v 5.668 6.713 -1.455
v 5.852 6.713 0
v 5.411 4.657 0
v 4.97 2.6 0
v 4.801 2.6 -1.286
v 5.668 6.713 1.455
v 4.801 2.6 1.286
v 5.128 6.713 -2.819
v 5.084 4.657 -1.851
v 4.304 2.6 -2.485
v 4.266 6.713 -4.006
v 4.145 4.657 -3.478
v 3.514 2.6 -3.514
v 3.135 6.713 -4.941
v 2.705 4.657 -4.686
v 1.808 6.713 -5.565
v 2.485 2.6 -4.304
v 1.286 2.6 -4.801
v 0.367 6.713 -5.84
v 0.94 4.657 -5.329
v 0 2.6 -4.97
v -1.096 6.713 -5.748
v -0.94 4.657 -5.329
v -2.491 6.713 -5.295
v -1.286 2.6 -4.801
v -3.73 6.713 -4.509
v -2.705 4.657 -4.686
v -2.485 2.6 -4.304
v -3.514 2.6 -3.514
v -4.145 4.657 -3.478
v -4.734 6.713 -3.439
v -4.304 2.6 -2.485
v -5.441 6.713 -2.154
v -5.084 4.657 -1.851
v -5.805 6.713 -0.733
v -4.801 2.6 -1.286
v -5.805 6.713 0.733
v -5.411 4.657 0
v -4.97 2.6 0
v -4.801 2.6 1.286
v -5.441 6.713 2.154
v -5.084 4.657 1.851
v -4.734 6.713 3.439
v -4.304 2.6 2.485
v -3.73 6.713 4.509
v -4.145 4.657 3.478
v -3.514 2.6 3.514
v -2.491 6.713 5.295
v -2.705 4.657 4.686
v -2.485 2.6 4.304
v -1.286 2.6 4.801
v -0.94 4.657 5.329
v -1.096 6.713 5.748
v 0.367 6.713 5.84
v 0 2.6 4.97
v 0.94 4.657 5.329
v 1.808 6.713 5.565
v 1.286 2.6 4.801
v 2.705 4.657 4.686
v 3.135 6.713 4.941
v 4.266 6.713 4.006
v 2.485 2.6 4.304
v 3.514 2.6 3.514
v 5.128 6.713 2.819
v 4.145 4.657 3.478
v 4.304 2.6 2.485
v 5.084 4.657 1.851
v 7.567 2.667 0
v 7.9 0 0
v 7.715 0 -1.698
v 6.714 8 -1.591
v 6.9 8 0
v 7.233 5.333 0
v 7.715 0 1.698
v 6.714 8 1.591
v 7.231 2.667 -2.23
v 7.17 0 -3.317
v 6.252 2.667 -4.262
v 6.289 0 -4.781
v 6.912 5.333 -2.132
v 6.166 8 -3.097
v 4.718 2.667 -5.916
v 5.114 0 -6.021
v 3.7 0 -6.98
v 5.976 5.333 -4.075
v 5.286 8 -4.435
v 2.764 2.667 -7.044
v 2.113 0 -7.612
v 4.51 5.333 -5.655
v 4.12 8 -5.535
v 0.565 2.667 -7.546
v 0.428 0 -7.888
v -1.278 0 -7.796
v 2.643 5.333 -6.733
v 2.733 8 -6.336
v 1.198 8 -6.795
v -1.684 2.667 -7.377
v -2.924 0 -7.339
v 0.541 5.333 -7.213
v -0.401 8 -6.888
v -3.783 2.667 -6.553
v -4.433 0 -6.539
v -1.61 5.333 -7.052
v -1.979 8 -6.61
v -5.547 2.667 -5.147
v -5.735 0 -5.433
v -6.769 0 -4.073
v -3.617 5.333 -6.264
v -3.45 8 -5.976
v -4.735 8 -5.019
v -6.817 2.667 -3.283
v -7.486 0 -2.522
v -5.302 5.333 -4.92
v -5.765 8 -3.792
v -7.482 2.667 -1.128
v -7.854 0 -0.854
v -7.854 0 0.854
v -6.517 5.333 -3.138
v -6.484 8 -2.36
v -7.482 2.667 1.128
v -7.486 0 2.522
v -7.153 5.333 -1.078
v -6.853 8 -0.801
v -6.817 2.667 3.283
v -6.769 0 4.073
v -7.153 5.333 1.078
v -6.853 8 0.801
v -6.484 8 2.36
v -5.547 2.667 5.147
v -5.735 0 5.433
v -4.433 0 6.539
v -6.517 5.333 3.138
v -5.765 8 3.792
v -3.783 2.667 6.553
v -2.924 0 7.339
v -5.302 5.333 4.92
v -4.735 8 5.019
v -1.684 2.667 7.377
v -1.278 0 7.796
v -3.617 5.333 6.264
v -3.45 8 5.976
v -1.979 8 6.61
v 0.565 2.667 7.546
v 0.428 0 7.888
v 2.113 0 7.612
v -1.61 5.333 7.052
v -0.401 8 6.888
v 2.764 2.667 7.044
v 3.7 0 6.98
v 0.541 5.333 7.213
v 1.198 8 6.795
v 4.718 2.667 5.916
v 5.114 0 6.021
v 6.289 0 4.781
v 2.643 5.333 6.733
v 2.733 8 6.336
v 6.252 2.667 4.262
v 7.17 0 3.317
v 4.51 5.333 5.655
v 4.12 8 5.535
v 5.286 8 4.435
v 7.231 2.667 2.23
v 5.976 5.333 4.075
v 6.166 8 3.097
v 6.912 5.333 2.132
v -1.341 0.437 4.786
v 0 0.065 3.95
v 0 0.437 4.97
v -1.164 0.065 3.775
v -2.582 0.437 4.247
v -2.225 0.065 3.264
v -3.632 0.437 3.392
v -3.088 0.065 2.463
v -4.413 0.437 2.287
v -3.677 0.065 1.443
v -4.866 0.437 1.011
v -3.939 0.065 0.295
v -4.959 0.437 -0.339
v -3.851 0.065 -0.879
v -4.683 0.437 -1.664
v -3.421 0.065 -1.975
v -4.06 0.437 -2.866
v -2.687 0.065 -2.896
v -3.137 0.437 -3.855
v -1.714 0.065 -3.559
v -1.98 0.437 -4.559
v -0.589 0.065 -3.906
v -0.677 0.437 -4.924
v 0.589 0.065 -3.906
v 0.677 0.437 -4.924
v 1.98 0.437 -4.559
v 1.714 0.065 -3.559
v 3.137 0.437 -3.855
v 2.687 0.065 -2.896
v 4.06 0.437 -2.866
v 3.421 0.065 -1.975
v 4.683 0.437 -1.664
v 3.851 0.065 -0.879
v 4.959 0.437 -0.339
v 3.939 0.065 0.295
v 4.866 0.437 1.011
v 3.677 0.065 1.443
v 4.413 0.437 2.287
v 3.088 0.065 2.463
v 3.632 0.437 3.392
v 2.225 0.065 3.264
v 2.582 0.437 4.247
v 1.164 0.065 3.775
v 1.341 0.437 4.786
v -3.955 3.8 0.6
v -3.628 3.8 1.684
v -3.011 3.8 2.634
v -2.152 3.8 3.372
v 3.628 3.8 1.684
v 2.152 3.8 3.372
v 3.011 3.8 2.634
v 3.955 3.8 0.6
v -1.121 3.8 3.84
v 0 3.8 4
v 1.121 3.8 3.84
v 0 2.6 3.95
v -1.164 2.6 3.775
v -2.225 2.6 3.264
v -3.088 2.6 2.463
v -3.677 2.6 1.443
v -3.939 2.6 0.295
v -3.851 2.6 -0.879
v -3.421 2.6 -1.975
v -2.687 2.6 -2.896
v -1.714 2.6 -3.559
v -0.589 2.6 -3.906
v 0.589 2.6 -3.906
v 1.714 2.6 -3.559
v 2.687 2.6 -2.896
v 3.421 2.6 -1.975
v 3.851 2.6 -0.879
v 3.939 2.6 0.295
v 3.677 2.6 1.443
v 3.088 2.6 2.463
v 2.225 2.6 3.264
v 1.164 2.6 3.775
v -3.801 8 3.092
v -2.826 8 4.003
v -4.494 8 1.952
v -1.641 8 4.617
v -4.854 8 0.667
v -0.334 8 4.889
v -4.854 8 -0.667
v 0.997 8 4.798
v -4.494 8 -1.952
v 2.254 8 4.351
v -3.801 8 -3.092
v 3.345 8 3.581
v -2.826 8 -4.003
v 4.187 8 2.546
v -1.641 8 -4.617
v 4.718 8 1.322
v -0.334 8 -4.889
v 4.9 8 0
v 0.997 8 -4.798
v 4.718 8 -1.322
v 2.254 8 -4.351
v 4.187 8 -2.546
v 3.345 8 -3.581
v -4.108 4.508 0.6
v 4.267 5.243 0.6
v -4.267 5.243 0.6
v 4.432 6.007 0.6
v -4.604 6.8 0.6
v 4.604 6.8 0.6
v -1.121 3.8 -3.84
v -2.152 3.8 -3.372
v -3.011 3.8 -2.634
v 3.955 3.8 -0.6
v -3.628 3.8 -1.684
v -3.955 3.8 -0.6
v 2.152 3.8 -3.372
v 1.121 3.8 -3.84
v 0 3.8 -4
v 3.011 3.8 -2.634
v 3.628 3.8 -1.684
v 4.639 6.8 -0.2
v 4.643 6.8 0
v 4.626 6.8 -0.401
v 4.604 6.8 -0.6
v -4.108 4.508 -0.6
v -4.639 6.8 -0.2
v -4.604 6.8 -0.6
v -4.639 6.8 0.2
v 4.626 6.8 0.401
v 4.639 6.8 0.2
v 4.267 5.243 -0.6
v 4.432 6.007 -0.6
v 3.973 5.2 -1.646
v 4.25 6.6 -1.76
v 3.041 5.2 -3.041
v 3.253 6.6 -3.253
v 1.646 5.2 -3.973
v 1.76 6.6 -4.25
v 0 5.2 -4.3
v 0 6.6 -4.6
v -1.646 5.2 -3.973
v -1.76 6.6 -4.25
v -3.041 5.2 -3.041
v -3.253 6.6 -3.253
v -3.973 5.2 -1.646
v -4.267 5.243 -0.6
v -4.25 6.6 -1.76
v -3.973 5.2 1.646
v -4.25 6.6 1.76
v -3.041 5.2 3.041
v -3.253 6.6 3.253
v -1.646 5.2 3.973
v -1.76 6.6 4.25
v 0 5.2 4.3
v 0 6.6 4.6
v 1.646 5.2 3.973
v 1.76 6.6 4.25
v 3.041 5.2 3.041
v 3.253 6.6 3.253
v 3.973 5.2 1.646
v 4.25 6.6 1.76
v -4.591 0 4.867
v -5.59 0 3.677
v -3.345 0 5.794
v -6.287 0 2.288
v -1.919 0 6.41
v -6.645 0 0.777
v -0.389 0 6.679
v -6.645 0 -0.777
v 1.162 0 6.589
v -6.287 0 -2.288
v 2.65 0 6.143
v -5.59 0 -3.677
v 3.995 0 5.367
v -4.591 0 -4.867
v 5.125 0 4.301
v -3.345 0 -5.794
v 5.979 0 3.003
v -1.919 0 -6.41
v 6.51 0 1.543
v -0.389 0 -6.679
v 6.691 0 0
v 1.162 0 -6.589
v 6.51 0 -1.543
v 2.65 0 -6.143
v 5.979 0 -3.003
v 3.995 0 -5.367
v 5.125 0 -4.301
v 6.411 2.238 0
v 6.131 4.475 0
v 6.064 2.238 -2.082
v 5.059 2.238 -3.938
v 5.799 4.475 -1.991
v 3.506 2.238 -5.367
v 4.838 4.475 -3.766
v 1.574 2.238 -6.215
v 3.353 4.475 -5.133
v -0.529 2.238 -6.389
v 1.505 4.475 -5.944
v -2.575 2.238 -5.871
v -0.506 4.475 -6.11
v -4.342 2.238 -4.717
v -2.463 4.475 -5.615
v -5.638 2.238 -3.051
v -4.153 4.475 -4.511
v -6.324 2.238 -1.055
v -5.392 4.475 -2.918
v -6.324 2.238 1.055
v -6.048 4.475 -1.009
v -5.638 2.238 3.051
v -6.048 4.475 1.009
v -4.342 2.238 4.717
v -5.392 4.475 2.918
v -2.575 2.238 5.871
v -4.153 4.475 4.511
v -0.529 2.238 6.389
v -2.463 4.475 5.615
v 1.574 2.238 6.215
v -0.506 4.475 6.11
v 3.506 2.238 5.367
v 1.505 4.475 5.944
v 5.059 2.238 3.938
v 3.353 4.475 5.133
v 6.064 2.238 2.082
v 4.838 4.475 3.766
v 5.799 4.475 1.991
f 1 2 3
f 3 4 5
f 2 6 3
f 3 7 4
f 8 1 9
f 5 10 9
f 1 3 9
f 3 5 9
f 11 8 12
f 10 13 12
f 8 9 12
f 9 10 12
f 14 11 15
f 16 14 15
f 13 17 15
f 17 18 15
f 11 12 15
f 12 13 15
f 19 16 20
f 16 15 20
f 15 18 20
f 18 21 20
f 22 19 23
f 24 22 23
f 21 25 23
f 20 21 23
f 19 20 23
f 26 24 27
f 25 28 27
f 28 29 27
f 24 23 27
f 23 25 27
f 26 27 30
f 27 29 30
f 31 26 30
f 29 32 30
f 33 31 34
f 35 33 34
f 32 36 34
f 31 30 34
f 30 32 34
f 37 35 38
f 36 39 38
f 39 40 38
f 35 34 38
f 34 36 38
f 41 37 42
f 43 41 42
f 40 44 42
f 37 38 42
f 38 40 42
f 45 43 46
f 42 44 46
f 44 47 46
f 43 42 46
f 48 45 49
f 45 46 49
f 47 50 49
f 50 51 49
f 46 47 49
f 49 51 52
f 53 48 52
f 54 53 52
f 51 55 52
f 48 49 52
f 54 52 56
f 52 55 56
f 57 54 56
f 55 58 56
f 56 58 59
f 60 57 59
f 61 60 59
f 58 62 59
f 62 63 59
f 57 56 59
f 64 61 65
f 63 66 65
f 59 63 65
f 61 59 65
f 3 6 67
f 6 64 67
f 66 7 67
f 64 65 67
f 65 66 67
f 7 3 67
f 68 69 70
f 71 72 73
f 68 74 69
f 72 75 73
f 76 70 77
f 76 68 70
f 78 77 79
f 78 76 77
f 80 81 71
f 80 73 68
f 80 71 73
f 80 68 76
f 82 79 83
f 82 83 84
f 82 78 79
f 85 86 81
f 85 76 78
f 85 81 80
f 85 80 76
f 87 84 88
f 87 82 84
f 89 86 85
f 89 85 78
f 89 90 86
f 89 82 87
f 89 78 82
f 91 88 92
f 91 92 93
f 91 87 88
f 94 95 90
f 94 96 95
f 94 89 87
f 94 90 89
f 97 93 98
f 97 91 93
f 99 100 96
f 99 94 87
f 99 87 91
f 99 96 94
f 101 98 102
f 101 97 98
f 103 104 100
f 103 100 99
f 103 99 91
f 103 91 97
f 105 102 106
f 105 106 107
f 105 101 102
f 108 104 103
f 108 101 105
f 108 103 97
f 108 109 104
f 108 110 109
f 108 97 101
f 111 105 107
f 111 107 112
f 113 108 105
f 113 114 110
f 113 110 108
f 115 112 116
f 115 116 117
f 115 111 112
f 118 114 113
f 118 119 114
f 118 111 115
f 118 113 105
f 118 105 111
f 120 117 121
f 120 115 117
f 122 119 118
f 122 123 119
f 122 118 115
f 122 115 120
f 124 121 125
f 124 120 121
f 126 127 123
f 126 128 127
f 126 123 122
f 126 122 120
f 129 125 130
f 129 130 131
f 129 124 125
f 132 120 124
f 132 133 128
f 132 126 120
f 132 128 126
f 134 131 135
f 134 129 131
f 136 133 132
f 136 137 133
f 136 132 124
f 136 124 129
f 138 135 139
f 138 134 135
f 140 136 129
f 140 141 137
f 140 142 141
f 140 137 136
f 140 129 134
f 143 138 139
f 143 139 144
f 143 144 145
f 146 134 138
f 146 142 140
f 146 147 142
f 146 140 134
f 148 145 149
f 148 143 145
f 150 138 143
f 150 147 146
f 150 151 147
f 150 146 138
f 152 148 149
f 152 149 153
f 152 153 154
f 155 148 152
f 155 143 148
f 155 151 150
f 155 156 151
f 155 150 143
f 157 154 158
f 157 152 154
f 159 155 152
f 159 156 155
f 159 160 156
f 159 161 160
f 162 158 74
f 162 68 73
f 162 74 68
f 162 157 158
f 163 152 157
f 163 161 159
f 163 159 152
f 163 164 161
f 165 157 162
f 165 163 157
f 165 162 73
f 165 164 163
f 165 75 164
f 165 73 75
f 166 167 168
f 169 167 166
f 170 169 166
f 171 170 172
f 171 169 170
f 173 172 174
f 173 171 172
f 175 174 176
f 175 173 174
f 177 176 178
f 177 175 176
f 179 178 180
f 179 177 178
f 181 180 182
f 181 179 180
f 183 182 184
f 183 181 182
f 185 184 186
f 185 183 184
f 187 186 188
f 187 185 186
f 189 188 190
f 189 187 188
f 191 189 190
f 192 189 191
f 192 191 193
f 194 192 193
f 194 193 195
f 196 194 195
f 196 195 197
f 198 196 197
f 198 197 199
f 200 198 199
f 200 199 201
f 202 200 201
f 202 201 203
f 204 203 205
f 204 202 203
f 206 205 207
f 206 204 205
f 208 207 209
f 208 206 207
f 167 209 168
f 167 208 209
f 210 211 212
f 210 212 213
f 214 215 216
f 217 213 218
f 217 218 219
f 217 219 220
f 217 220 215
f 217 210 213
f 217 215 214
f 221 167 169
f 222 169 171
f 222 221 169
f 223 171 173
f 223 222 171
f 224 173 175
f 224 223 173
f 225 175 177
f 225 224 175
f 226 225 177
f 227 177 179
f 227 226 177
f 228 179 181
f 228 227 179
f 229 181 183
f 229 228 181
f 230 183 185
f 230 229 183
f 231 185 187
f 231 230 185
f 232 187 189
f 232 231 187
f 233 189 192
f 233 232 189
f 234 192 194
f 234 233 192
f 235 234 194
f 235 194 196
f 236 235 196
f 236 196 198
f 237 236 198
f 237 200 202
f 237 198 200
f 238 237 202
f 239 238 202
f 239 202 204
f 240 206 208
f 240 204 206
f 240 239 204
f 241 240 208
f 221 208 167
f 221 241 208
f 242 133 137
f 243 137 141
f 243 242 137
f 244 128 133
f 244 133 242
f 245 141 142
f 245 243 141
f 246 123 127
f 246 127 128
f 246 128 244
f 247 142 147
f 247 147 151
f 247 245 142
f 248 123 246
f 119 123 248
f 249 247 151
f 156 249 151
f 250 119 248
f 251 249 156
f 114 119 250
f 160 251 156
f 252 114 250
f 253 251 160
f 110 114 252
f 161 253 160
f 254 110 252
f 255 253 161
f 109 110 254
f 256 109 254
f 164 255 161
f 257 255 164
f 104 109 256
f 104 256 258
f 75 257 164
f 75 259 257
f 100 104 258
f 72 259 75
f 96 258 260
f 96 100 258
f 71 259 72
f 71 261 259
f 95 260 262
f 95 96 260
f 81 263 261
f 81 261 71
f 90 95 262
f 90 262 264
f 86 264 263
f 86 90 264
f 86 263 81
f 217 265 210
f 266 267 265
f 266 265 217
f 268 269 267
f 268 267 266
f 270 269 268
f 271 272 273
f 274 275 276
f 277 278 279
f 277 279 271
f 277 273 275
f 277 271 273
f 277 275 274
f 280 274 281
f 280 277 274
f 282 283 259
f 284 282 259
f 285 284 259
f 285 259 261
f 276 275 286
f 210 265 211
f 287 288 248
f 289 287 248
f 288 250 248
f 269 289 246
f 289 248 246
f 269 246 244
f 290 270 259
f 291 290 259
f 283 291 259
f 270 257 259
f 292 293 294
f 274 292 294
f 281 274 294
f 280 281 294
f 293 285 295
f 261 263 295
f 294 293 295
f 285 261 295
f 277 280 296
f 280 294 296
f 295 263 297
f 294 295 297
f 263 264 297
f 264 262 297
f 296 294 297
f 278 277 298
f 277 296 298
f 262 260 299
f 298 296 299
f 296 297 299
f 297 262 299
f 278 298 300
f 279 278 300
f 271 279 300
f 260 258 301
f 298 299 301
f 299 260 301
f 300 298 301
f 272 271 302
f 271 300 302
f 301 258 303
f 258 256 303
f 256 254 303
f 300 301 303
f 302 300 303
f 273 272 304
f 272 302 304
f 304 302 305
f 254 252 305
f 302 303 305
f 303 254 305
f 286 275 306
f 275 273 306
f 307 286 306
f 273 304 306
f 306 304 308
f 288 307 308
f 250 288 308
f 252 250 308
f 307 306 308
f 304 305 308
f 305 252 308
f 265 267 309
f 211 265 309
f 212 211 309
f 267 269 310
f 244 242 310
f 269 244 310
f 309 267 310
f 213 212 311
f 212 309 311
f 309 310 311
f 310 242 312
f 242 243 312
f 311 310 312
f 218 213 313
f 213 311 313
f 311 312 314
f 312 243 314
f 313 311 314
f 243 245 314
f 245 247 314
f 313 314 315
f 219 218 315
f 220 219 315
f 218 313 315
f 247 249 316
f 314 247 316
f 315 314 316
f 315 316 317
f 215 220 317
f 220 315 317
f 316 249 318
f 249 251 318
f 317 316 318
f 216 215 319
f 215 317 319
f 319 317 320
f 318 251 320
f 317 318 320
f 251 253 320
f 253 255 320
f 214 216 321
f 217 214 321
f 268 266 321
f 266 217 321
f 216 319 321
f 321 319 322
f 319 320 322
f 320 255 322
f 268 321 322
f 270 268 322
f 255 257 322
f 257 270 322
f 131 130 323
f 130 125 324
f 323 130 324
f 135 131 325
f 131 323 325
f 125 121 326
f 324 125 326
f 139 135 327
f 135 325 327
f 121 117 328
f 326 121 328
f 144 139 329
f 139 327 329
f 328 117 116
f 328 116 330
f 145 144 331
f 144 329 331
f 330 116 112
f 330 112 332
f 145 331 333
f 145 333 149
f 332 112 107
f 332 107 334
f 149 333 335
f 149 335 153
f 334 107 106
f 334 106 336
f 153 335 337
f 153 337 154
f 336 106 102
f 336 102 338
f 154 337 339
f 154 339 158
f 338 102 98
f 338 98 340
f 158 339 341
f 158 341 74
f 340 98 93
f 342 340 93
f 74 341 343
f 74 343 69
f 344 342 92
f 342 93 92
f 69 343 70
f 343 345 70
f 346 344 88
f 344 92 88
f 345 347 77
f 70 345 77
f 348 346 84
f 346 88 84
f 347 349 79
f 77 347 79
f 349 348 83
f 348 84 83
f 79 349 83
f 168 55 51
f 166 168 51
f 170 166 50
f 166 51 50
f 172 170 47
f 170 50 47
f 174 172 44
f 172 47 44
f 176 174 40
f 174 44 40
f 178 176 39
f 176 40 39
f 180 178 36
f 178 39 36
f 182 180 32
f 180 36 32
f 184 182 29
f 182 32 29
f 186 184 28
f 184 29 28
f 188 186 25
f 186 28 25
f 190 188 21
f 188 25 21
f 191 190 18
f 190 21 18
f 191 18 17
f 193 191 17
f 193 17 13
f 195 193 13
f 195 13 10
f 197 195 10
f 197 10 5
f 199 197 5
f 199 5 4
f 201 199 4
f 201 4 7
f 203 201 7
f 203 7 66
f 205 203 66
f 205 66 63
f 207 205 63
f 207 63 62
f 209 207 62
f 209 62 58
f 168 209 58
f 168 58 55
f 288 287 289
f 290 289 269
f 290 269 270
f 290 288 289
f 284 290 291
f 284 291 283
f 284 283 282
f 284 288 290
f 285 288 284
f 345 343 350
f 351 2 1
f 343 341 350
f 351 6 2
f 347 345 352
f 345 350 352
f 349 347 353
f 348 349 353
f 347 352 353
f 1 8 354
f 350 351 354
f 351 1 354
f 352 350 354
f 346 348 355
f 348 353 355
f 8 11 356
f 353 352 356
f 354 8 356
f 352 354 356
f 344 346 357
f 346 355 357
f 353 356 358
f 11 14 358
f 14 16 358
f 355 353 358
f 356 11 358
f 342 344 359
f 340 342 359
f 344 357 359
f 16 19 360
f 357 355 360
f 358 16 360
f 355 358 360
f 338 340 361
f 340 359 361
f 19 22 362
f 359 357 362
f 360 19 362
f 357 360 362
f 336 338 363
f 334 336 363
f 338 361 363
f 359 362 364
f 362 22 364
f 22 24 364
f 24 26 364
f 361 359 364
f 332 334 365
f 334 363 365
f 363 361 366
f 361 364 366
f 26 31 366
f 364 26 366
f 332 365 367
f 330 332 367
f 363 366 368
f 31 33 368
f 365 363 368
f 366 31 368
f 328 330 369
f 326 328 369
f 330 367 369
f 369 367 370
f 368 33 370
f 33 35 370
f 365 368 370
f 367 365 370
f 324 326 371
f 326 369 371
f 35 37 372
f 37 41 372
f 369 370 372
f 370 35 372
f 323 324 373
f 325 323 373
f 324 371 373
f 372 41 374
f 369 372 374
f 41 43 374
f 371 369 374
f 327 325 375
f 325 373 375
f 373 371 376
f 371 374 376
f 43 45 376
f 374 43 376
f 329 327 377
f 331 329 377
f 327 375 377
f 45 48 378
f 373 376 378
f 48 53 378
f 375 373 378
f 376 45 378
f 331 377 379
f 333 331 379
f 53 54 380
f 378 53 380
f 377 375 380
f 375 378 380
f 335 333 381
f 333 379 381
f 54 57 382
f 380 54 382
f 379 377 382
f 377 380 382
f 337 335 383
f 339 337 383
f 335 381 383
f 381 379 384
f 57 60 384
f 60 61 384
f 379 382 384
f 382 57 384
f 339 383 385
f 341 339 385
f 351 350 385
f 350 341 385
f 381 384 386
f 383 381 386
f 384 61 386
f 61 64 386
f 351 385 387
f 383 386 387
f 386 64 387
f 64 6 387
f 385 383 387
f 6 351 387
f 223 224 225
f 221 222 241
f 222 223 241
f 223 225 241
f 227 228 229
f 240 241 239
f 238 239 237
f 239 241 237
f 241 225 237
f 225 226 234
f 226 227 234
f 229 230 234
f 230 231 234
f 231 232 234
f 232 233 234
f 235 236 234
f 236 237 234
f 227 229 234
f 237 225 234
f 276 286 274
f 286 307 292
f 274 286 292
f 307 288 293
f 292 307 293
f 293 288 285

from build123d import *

# Parameters (mm, degrees)
SKETCH1_R           = 7.9
SKETCH2_R           = 6.9
SKETCH4_R           = 4
SKETCH3_R           = 4.9
SKETCH7_W           = 12
SKETCH7_H           = 1.2
BOSS_EXTRUDE2_DEPTH = 3
SKETCH8_R           = 4.970098948
SKETCH8_R_2         = 3.95
BOSS_EXTRUDE3_DEPTH = 2.6
CHAMFER1_SIZE       = 0.436764281
CHAMFER1_SIZE_2     = 1.2


# Read off the part's stored shape, not the designer's step: Shell1
with BuildPart() as part:
    # Sketch1 → Loft1 section 0
    with BuildSketch(Plane(origin=(0, 0, 0), x_dir=(1, 0, 0), z_dir=(0, 1, 0))):
        Circle(SKETCH1_R)
    # Sketch2 → Loft1 section 1
    with BuildSketch(Plane(origin=(0, 8, 0), x_dir=(1, 0, 0), z_dir=(0, 1, 0))):
        Circle(SKETCH2_R)
    loft()

    # Sketch4 → Cut-Loft2 section 0
    with BuildSketch(Plane(origin=(0, 3.8, 0), x_dir=(1, 0, 0), z_dir=(0, 1, 0))):
        Circle(SKETCH4_R)
    # Sketch3 → Cut-Loft2 section 1
    with BuildSketch(Plane(origin=(0, 8, 0), x_dir=(1, 0, 0), z_dir=(0, 1, 0))):
        Circle(SKETCH3_R)
    loft(mode=Mode.SUBTRACT)

    # Sketch7 → Boss-Extrude2 (add)
    with BuildSketch(Plane(origin=(0, 6.8, 0), x_dir=(1, 0, 0), z_dir=(0, 1, 0))):
        Rectangle(SKETCH7_W, SKETCH7_H)
    extrude(amount=-BOSS_EXTRUDE2_DEPTH)

    # Shell1 outline → Shell1 (revolve, cut)
    with BuildSketch(Plane.XY):
        Polygon((5.851506773, 6.713236516), (4.970098948, 2.6), (0, 2.6), (0, 0), (6.690661338, 0), align=None)
    revolve(axis=Axis((0, 0, 0), (0, 1, 0)), mode=Mode.SUBTRACT)

    # Sketch8 → Boss-Extrude3 (add)
    with BuildSketch(Plane.XZ.offset(-2.6)):
        with Locations(Location((0, 0, 0), (0, 0, 90))):
            Circle(SKETCH8_R)
        with Locations(Location((0, 0, 0), (0, 0, 90))):
            Circle(SKETCH8_R_2, mode=Mode.SUBTRACT)
    extrude(amount=BOSS_EXTRUDE3_DEPTH)

    # Chamfer1
    # the kernel refuses this chamfer: 1.2, 0.436764281 mm, written as the material it takes off along each edge
    with BuildSketch(Plane(origin=(0, 0, 0), x_dir=(0, 0, 1), z_dir=(1, 0, 0))) as chamfer1_piece_1:
        Polygon((4.970098948, -CHAMFER1_SIZE), (4.970098948 - CHAMFER1_SIZE_2, 0), (4.970098948, 0), align=None)
    revolve(axis=Axis((0, 0, 0), (0, -1, 0)), mode=Mode.SUBTRACT)


solid = part.part
